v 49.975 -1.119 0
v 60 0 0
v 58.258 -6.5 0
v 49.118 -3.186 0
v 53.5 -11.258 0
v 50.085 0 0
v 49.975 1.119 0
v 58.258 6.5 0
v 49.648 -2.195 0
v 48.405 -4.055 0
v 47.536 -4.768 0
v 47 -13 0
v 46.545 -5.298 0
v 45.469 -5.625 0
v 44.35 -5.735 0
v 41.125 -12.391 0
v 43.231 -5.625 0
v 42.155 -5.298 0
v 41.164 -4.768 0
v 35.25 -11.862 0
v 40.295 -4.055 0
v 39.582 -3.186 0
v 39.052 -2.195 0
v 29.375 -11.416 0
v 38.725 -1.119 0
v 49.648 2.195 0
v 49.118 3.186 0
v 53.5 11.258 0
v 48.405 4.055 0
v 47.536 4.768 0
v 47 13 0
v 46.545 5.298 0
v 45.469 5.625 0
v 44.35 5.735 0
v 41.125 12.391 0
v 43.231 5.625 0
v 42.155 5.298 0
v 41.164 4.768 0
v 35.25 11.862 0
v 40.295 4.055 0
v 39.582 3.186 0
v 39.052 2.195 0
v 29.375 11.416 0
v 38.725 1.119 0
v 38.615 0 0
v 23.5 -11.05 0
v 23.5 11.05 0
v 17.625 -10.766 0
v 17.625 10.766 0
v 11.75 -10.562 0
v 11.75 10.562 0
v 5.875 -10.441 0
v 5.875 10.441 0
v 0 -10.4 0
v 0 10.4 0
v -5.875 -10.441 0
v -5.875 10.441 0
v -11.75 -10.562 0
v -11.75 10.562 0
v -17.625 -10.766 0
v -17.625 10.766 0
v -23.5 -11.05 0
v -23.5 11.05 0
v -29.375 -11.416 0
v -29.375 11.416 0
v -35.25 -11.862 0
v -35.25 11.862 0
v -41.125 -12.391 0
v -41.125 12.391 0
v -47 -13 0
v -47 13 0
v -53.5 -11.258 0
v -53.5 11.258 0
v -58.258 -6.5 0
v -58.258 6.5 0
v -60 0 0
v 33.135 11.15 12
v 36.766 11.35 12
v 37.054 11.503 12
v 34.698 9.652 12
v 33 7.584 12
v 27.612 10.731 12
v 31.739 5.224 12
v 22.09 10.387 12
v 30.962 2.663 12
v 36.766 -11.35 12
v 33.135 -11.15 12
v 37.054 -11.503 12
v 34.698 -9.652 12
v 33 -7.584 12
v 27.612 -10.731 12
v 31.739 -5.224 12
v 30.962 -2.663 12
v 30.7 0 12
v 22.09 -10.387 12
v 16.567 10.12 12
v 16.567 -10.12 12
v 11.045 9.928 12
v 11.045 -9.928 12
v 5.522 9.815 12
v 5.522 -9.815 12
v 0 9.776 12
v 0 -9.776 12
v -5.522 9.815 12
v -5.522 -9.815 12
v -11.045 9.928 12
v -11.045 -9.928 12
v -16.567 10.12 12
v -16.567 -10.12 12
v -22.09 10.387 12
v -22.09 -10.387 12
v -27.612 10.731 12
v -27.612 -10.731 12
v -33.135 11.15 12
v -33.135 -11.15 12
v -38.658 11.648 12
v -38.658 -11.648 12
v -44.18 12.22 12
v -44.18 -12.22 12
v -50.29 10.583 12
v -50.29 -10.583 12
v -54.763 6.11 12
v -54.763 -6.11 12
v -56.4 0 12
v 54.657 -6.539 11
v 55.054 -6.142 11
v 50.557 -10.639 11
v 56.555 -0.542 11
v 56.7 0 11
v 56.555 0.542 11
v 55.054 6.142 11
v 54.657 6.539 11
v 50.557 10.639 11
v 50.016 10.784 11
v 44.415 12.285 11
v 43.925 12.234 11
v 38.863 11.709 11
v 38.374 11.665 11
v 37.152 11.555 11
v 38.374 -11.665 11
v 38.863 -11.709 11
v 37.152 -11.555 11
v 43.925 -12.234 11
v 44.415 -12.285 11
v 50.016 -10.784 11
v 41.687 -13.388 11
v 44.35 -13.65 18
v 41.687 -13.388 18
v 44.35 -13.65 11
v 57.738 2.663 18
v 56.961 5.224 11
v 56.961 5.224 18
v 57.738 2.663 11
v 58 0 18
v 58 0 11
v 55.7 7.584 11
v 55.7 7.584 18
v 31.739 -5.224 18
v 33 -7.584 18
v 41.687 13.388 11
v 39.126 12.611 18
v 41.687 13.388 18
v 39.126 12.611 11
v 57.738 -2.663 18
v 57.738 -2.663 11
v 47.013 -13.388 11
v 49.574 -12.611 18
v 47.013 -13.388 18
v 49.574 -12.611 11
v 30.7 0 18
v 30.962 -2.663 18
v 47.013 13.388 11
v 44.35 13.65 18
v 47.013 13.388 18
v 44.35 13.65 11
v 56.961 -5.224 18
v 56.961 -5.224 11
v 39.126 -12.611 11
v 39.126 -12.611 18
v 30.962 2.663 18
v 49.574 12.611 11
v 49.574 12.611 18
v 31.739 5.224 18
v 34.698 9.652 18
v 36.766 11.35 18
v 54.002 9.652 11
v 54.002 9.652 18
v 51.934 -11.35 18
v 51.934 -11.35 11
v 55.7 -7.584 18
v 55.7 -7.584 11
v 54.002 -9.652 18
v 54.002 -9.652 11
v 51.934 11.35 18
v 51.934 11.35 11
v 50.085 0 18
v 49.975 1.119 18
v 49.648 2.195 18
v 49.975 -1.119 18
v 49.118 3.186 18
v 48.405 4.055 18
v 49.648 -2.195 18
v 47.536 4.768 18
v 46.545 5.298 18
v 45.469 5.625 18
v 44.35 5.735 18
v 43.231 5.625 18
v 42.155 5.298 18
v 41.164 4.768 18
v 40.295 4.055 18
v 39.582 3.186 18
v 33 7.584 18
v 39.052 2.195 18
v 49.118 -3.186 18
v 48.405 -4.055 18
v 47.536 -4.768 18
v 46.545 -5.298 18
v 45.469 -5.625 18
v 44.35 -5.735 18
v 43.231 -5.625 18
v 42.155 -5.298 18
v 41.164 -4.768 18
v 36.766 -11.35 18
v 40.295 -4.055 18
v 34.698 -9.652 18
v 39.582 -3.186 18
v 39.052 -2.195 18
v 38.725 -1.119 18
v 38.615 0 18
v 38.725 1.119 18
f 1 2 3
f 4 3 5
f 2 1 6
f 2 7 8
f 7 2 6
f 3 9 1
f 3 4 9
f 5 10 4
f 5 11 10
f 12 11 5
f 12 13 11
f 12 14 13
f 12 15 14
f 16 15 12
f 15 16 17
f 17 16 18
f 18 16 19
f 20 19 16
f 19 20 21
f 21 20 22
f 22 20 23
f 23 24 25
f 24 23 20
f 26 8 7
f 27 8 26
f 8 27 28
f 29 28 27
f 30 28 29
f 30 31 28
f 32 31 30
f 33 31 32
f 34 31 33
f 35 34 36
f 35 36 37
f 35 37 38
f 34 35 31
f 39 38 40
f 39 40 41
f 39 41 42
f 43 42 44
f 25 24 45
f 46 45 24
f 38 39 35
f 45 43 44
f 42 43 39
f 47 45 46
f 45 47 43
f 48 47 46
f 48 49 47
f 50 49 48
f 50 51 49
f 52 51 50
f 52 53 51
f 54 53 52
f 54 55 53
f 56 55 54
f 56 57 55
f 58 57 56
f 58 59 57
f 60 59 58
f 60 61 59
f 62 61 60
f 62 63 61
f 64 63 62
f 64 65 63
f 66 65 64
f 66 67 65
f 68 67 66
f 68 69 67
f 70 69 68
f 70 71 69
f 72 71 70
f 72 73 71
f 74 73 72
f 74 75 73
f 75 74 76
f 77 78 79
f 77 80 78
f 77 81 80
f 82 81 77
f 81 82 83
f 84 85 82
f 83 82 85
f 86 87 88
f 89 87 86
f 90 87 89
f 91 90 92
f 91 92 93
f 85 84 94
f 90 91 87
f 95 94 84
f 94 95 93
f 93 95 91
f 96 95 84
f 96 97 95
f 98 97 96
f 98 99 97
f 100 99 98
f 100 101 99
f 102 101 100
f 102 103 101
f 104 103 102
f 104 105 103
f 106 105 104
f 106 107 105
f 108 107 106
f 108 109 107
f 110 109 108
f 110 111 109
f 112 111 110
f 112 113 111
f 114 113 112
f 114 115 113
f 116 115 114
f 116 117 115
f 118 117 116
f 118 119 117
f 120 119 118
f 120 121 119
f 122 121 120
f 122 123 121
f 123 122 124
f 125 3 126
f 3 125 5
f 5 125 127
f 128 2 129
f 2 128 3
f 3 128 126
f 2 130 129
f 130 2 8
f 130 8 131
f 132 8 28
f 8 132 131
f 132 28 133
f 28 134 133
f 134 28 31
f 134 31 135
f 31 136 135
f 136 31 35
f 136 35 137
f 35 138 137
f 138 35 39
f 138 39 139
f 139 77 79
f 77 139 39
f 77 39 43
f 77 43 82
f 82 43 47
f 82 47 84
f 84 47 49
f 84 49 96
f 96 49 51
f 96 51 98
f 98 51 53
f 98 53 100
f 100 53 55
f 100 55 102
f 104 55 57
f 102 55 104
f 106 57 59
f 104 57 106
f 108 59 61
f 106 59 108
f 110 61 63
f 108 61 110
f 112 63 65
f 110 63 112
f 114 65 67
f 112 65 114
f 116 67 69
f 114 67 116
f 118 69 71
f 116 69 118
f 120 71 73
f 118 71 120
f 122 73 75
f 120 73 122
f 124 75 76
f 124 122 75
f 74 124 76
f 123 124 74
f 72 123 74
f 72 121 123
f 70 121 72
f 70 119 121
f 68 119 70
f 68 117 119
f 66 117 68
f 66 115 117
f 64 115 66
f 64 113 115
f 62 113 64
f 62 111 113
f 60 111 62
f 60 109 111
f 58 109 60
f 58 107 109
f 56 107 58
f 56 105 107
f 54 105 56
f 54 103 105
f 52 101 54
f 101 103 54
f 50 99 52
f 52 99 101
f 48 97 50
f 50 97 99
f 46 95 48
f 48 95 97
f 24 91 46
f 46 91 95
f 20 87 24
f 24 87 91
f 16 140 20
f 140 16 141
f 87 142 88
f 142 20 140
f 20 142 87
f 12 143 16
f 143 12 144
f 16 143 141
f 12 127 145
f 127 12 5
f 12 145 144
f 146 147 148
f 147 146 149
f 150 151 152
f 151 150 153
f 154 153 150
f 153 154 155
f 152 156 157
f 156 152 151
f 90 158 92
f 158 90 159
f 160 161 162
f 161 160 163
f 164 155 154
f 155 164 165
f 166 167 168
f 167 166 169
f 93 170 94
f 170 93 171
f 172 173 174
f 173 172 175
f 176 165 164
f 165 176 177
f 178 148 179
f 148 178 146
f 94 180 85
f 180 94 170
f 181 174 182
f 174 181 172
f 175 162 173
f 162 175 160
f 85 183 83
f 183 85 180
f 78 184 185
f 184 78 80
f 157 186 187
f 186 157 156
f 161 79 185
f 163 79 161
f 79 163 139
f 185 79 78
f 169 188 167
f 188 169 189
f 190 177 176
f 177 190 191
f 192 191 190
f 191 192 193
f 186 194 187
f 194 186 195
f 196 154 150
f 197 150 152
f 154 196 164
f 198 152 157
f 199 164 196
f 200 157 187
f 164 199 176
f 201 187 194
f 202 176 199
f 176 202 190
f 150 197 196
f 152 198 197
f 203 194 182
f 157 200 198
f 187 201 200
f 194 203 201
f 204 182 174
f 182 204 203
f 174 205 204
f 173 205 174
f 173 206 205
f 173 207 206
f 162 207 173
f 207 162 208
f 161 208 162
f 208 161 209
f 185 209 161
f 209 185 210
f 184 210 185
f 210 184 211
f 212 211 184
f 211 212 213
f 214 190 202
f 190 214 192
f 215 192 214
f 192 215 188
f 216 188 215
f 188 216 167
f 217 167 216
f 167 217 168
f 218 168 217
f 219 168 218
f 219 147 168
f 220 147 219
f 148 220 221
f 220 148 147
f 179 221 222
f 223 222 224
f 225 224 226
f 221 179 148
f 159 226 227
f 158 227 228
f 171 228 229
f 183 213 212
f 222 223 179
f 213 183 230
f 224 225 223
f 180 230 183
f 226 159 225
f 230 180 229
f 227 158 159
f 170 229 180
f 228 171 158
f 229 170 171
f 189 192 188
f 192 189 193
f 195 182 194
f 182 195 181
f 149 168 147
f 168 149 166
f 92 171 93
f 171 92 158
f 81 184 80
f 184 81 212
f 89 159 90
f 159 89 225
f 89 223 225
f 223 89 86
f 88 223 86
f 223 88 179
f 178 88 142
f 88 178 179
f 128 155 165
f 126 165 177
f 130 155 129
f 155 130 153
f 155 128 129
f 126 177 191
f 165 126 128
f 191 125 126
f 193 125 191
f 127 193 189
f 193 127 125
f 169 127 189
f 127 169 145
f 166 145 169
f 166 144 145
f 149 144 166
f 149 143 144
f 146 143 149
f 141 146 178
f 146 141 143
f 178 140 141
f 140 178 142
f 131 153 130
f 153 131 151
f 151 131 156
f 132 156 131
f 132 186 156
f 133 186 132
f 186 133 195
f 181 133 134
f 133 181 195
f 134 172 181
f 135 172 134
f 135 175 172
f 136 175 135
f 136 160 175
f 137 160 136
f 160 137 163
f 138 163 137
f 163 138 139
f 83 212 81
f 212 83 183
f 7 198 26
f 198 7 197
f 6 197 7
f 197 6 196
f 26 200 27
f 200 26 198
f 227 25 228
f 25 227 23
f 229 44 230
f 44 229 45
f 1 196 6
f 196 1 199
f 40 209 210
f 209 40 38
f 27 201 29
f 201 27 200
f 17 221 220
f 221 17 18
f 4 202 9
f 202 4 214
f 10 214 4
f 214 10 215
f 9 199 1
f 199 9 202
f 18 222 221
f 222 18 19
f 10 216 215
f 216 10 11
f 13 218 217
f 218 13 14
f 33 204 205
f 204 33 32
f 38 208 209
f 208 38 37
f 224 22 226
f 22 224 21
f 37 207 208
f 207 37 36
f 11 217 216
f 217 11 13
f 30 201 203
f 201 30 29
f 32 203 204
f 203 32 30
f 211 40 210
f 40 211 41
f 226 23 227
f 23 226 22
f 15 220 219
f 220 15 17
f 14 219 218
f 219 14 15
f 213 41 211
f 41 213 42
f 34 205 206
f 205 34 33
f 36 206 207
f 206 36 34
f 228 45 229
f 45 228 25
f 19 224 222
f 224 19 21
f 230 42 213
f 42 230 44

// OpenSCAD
$fn = 32;

// ----------------------------------------------------------------------
// Handle: 120 x 26 mm grip, 12 mm thick
// ----------------------------------------------------------------------

// --- parameters (mm) ---
length = 120;             // grip length
width = 26;               // grip width
thickness = 12;           // grip thickness
waist = 0.8;              // width factor at the middle
draft = 0.94;             // top face scale of the extrusion
boss_d = 27.3;            // mounting boss diameter
boss_h = 6;               // mounting boss height
boss_hole_d = 11.47;      // screw clearance through the boss
boss_r = 44.35;           // boss centre from the grip centre

/* ergonomic grip outline, closed spline-like polygon in the XY plane */
grip = [[-47, 13], [-41.125, 12.391], [-35.25, 11.862], [-29.375, 11.416], [-23.5, 11.05], [-17.625, 10.766], [-11.75, 10.562], [-5.875, 10.441], [0, 10.4], [5.875, 10.441], [11.75, 10.562], [17.625, 10.766], [23.5, 11.05], [29.375, 11.416], [35.25, 11.862], [41.125, 12.391], [47, 13], [53.5, 11.258], [58.258, 6.5], [60, 0], [58.258, -6.5], [53.5, -11.258], [47, -13], [47, -13], [41.125, -12.391], [35.25, -11.862], [29.375, -11.416], [23.5, -11.05], [17.625, -10.766], [11.75, -10.562], [5.875, -10.441], [0, -10.4], [-5.875, -10.441], [-11.75, -10.562], [-17.625, -10.766], [-23.5, -11.05], [-29.375, -11.416], [-35.25, -11.862], [-41.125, -12.391], [-47, -13], [-53.5, -11.258], [-58.258, -6.5], [-60, 0], [-58.258, 6.5], [-53.5, 11.258], [-47, 13]];

module grip_body() {
  linear_extrude(height = thickness, scale = draft) polygon(grip);
}

module boss_body() {
  /* sunk 1 mm into the grip so the joint overlaps */
  translate([boss_r, 0, thickness - 1]) cylinder(h = boss_h + 1, d = boss_d);
}

difference() {
  union() {
    grip_body();
    boss_body();
  }
  translate([boss_r, 0, -1]) cylinder(h = thickness + boss_h + 2, d = boss_hole_d);
}
